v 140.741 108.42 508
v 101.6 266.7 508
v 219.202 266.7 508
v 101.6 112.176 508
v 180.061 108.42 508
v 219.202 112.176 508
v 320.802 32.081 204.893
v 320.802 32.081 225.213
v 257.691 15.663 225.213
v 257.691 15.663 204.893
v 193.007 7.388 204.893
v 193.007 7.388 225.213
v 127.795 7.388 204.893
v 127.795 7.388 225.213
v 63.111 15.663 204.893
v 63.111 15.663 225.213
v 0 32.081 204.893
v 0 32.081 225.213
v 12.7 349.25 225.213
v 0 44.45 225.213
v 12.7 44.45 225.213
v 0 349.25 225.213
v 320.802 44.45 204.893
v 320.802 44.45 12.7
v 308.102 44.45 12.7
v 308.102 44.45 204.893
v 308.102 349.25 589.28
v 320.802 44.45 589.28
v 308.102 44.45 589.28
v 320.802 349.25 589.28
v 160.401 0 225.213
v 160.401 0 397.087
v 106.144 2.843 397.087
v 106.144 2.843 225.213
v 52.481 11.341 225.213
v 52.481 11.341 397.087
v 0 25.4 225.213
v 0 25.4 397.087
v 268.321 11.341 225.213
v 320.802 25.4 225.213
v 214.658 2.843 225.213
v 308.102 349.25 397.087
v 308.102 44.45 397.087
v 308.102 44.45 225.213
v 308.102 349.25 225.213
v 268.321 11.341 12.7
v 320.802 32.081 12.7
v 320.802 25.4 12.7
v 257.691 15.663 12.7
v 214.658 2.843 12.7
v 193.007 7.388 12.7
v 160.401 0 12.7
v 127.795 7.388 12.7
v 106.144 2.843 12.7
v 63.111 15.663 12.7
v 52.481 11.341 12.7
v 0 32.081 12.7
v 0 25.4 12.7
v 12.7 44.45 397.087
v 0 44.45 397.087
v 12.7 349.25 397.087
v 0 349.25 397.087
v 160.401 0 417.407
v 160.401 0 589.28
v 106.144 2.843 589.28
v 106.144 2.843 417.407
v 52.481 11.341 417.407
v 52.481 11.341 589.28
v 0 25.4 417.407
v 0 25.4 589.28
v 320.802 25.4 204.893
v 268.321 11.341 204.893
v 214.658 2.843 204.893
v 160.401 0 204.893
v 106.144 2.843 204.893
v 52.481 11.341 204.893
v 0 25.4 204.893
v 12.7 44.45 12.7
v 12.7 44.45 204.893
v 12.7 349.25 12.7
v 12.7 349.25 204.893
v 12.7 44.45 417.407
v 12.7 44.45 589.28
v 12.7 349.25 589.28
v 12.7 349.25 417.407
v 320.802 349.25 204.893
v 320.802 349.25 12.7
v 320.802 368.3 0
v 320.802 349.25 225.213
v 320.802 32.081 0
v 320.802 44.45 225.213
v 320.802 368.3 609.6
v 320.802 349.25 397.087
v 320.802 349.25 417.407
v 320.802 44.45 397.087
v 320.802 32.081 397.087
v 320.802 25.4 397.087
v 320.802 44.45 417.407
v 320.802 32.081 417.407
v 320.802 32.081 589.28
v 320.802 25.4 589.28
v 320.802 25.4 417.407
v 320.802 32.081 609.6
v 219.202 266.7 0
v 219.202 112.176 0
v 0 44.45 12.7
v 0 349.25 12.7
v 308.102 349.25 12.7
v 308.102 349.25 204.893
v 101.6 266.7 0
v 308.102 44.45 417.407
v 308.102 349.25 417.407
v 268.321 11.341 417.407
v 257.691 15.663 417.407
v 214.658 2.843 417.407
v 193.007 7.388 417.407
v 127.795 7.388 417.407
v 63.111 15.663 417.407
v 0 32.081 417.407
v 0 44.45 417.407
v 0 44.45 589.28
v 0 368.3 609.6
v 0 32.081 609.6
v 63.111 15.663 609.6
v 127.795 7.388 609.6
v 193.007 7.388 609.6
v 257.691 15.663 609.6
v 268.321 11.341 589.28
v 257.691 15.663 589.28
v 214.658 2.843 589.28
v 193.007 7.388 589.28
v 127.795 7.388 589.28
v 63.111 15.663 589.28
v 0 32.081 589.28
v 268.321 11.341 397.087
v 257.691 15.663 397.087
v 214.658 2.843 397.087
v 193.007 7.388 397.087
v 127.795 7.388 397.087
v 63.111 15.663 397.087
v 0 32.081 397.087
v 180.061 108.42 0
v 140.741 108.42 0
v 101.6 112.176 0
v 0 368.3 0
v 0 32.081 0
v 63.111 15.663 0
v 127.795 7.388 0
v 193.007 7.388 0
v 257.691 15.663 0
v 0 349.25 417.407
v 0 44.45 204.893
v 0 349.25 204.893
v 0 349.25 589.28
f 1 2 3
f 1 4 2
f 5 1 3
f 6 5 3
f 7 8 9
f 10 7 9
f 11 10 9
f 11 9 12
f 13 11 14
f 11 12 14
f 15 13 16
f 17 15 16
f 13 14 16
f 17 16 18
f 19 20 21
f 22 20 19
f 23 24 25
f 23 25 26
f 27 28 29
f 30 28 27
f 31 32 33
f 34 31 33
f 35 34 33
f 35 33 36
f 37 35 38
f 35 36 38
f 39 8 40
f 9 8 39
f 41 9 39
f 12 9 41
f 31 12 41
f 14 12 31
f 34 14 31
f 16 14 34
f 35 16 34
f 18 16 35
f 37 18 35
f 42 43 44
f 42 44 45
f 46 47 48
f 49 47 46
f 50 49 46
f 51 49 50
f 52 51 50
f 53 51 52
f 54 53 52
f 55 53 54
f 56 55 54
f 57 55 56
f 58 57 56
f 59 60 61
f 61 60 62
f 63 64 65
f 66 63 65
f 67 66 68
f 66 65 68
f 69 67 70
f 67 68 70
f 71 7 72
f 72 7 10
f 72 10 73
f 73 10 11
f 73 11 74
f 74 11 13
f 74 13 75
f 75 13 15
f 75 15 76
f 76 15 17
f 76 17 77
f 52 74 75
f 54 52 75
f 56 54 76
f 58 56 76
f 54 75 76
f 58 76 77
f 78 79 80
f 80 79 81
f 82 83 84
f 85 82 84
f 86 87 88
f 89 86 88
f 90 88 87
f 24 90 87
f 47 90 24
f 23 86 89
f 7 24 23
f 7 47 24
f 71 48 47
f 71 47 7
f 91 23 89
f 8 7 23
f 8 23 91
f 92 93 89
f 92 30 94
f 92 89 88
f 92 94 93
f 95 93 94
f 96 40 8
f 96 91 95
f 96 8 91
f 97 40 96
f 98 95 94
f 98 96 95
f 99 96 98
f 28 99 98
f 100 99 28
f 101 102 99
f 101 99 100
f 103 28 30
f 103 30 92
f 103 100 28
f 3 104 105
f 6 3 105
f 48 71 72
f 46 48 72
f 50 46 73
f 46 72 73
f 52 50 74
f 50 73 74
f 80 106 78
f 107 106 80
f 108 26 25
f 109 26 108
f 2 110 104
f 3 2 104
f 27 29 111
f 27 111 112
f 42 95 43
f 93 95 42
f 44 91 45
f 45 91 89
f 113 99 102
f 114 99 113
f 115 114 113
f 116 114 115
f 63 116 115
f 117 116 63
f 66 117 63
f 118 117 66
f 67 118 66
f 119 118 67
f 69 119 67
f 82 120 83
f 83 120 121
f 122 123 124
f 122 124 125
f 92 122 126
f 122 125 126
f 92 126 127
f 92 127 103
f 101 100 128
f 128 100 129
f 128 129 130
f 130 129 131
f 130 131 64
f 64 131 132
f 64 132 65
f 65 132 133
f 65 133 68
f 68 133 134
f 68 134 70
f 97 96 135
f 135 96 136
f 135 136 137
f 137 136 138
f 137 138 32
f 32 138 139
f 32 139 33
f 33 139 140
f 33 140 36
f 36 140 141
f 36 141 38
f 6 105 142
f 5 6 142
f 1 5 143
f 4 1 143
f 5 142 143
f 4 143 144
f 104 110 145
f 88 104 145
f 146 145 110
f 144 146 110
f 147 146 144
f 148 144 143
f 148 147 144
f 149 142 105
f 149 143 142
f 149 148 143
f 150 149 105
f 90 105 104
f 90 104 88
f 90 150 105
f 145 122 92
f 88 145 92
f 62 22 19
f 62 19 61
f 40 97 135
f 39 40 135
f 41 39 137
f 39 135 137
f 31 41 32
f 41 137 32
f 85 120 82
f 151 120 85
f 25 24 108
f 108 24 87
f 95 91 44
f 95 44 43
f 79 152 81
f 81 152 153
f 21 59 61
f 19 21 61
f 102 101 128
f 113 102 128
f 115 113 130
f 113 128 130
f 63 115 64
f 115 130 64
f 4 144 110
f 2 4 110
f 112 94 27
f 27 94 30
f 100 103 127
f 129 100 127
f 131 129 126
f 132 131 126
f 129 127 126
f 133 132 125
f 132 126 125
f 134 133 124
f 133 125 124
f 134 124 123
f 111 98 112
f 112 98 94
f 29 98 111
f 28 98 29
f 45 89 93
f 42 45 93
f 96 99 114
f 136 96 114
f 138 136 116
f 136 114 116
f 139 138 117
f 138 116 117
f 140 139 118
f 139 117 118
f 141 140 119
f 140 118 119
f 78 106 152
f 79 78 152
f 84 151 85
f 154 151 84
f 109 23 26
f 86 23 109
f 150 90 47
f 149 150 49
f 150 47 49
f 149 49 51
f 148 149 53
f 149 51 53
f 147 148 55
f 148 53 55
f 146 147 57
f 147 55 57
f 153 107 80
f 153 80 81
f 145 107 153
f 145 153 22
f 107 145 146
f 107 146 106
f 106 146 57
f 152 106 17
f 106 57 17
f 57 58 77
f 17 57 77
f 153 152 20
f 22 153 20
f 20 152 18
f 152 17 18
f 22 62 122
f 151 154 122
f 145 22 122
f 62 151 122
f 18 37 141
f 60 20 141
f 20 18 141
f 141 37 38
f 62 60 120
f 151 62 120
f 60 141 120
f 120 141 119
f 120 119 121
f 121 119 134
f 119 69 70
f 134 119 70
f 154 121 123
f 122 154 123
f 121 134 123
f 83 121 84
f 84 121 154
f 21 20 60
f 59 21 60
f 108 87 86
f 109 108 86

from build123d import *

# Parameters (mm, degrees)
F0_W      = 320.802
F0_H      = 609.6
F1_DEPTH  = 368.3
F3_DEPTH  = 609.601
F6_W      = 6.35
F6_H      = 20.32
F6_H_2    = 12.7
F8_W      = 304.8
F8_H      = 171.8733333333
F8_H_2    = 192.1933333333
F9_DEPTH  = 12.7
F11_DEPTH = 508


# Not quite as in the source:
# - a pattern or mirror of a feature is missing from the dataset's text; its kind, count and spacing are read off the source's solid


with BuildPart() as f1:
    # F0 (on Front) → F1 (new body)
    with BuildSketch(Plane.XZ):
        with Locations((160.401, 304.8)):
            Rectangle(F0_W, F0_H)
    extrude(amount=-F1_DEPTH)

    # F2 (on face) → F3 (cut, through all)
    with BuildSketch(Plane.XY.offset(609.6)):
        with BuildLine():
            ThreePointArc((160.401, 0), (79.2011834962, 6.3893162785), (0, 25.4))
            Line((0, 25.4), (0, 0))
            Line((0, 0), (160.401, 0))
        make_face()
        with BuildLine():
            Line((320.802, 0), (320.802, 25.4))
            ThreePointArc((320.802, 25.4), (241.6008165038, 6.3893162785), (160.401, 0))
            Line((160.401, 0), (320.802, 0))
        make_face()
    extrude(amount=-F3_DEPTH, mode=Mode.SUBTRACT)

    # F6 (on mid) → F7 (revolve, cut)
    with BuildSketch(Plane.YZ.offset(160.401)):
        with Locations((3.175, 599.44)):
            Rectangle(F6_W, F6_H)
        with Locations((3.175, 407.2466666667)):
            Rectangle(F6_W, F6_H)
        with Locations((3.175, 215.0533333333)):
            Rectangle(F6_W, F6_H)
        with Locations((3.175, 6.35)):
            Rectangle(F6_W, F6_H_2)
    revolve(axis=Axis((160.401, 519.1661575, 538.612387991), (0, 0, -1)), mode=Mode.SUBTRACT)

    # F8 (on face) → F9 (cut)
    with BuildSketch(Plane.YZ.offset(320.802)):
        with Locations((196.85, 503.3433333333)):
            Rectangle(F8_W, F8_H)
        with Locations((196.85, 311.15)):
            Rectangle(F8_W, F8_H)
        with Locations((196.85, 108.7966666667)):
            Rectangle(F8_W, F8_H_2)
    f9 = extrude(amount=-F9_DEPTH, mode=Mode.SUBTRACT)

    # F9_copies: F9 across plane
    add(f9.mirror(Plane(origin=(160.401, 0, 0), x_dir=(0, 0, -1), z_dir=(-1, 0, 0))), mode=Mode.SUBTRACT)

    # F10 (on face) → F11 (cut)
    with BuildSketch(Plane(origin=(0, 0, 0), x_dir=(1, 0, 0), z_dir=(0, 0, -1))):
        with BuildLine():
            Line((101.6, -266.7), (219.202, -266.7))
            Line((219.202, -266.7), (219.202, -112.1757760558))
            ThreePointArc((219.202, -112.1757760558), (160.401, -107.95), (101.6, -112.1757760558))
            Line((101.6, -112.1757760558), (101.6, -266.7))
        make_face()
    extrude(amount=-F11_DEPTH, mode=Mode.SUBTRACT)


solid = f1.part
